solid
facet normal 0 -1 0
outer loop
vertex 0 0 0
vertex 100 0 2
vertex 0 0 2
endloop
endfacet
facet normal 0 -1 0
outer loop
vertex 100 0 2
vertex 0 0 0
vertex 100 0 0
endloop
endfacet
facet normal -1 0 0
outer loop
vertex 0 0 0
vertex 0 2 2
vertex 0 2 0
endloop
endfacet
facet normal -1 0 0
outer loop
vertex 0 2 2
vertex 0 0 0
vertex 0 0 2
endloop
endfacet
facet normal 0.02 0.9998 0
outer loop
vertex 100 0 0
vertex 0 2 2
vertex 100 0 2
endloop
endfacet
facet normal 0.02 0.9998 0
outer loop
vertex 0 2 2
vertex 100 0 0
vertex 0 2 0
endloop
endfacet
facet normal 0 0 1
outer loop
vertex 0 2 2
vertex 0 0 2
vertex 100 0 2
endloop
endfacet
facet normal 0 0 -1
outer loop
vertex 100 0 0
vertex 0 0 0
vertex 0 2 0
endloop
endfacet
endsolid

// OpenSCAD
// Arachne thin wall wedge test
// wedge wall along X
// https://www.printables.com/model/286864
// https://www.thingiverse.com/thing:5541710

// Customization options
// height of wedge wall
height = 2; // 0.1 mm 

//length of wedge 
length = 100; // 1 mm

//width of wide end
thickness = 2; // 0.1 mm

// rotation from vertical wedge wall along x
rot = [0,0,0]; // xyz deg

rotate(rot)wedge(length,height,thickness);

module wedge(len, wid, thick){ // change prism orientation to wall along x
    translate([len,0,height])
        rotate([90,90,180])
            prism(wid,len,thickness);
}

module prism(l, w, h){ // x,y,z
    // from https://en.m.wikibooks.org/wiki/OpenSCAD_User_Manual/Primitive_Solids
    // copied 2022-10-01 
      polyhedron(//pt 0        1        2        3        4        5
              points=[[0,0,0], [l,0,0], [l,w,0], [0,w,0], [0,w,h], [l,w,h]],
              faces=[[0,1,2,3],[5,4,3,2],[0,4,5,1],[0,3,4],[5,2,1]]
              );
}
